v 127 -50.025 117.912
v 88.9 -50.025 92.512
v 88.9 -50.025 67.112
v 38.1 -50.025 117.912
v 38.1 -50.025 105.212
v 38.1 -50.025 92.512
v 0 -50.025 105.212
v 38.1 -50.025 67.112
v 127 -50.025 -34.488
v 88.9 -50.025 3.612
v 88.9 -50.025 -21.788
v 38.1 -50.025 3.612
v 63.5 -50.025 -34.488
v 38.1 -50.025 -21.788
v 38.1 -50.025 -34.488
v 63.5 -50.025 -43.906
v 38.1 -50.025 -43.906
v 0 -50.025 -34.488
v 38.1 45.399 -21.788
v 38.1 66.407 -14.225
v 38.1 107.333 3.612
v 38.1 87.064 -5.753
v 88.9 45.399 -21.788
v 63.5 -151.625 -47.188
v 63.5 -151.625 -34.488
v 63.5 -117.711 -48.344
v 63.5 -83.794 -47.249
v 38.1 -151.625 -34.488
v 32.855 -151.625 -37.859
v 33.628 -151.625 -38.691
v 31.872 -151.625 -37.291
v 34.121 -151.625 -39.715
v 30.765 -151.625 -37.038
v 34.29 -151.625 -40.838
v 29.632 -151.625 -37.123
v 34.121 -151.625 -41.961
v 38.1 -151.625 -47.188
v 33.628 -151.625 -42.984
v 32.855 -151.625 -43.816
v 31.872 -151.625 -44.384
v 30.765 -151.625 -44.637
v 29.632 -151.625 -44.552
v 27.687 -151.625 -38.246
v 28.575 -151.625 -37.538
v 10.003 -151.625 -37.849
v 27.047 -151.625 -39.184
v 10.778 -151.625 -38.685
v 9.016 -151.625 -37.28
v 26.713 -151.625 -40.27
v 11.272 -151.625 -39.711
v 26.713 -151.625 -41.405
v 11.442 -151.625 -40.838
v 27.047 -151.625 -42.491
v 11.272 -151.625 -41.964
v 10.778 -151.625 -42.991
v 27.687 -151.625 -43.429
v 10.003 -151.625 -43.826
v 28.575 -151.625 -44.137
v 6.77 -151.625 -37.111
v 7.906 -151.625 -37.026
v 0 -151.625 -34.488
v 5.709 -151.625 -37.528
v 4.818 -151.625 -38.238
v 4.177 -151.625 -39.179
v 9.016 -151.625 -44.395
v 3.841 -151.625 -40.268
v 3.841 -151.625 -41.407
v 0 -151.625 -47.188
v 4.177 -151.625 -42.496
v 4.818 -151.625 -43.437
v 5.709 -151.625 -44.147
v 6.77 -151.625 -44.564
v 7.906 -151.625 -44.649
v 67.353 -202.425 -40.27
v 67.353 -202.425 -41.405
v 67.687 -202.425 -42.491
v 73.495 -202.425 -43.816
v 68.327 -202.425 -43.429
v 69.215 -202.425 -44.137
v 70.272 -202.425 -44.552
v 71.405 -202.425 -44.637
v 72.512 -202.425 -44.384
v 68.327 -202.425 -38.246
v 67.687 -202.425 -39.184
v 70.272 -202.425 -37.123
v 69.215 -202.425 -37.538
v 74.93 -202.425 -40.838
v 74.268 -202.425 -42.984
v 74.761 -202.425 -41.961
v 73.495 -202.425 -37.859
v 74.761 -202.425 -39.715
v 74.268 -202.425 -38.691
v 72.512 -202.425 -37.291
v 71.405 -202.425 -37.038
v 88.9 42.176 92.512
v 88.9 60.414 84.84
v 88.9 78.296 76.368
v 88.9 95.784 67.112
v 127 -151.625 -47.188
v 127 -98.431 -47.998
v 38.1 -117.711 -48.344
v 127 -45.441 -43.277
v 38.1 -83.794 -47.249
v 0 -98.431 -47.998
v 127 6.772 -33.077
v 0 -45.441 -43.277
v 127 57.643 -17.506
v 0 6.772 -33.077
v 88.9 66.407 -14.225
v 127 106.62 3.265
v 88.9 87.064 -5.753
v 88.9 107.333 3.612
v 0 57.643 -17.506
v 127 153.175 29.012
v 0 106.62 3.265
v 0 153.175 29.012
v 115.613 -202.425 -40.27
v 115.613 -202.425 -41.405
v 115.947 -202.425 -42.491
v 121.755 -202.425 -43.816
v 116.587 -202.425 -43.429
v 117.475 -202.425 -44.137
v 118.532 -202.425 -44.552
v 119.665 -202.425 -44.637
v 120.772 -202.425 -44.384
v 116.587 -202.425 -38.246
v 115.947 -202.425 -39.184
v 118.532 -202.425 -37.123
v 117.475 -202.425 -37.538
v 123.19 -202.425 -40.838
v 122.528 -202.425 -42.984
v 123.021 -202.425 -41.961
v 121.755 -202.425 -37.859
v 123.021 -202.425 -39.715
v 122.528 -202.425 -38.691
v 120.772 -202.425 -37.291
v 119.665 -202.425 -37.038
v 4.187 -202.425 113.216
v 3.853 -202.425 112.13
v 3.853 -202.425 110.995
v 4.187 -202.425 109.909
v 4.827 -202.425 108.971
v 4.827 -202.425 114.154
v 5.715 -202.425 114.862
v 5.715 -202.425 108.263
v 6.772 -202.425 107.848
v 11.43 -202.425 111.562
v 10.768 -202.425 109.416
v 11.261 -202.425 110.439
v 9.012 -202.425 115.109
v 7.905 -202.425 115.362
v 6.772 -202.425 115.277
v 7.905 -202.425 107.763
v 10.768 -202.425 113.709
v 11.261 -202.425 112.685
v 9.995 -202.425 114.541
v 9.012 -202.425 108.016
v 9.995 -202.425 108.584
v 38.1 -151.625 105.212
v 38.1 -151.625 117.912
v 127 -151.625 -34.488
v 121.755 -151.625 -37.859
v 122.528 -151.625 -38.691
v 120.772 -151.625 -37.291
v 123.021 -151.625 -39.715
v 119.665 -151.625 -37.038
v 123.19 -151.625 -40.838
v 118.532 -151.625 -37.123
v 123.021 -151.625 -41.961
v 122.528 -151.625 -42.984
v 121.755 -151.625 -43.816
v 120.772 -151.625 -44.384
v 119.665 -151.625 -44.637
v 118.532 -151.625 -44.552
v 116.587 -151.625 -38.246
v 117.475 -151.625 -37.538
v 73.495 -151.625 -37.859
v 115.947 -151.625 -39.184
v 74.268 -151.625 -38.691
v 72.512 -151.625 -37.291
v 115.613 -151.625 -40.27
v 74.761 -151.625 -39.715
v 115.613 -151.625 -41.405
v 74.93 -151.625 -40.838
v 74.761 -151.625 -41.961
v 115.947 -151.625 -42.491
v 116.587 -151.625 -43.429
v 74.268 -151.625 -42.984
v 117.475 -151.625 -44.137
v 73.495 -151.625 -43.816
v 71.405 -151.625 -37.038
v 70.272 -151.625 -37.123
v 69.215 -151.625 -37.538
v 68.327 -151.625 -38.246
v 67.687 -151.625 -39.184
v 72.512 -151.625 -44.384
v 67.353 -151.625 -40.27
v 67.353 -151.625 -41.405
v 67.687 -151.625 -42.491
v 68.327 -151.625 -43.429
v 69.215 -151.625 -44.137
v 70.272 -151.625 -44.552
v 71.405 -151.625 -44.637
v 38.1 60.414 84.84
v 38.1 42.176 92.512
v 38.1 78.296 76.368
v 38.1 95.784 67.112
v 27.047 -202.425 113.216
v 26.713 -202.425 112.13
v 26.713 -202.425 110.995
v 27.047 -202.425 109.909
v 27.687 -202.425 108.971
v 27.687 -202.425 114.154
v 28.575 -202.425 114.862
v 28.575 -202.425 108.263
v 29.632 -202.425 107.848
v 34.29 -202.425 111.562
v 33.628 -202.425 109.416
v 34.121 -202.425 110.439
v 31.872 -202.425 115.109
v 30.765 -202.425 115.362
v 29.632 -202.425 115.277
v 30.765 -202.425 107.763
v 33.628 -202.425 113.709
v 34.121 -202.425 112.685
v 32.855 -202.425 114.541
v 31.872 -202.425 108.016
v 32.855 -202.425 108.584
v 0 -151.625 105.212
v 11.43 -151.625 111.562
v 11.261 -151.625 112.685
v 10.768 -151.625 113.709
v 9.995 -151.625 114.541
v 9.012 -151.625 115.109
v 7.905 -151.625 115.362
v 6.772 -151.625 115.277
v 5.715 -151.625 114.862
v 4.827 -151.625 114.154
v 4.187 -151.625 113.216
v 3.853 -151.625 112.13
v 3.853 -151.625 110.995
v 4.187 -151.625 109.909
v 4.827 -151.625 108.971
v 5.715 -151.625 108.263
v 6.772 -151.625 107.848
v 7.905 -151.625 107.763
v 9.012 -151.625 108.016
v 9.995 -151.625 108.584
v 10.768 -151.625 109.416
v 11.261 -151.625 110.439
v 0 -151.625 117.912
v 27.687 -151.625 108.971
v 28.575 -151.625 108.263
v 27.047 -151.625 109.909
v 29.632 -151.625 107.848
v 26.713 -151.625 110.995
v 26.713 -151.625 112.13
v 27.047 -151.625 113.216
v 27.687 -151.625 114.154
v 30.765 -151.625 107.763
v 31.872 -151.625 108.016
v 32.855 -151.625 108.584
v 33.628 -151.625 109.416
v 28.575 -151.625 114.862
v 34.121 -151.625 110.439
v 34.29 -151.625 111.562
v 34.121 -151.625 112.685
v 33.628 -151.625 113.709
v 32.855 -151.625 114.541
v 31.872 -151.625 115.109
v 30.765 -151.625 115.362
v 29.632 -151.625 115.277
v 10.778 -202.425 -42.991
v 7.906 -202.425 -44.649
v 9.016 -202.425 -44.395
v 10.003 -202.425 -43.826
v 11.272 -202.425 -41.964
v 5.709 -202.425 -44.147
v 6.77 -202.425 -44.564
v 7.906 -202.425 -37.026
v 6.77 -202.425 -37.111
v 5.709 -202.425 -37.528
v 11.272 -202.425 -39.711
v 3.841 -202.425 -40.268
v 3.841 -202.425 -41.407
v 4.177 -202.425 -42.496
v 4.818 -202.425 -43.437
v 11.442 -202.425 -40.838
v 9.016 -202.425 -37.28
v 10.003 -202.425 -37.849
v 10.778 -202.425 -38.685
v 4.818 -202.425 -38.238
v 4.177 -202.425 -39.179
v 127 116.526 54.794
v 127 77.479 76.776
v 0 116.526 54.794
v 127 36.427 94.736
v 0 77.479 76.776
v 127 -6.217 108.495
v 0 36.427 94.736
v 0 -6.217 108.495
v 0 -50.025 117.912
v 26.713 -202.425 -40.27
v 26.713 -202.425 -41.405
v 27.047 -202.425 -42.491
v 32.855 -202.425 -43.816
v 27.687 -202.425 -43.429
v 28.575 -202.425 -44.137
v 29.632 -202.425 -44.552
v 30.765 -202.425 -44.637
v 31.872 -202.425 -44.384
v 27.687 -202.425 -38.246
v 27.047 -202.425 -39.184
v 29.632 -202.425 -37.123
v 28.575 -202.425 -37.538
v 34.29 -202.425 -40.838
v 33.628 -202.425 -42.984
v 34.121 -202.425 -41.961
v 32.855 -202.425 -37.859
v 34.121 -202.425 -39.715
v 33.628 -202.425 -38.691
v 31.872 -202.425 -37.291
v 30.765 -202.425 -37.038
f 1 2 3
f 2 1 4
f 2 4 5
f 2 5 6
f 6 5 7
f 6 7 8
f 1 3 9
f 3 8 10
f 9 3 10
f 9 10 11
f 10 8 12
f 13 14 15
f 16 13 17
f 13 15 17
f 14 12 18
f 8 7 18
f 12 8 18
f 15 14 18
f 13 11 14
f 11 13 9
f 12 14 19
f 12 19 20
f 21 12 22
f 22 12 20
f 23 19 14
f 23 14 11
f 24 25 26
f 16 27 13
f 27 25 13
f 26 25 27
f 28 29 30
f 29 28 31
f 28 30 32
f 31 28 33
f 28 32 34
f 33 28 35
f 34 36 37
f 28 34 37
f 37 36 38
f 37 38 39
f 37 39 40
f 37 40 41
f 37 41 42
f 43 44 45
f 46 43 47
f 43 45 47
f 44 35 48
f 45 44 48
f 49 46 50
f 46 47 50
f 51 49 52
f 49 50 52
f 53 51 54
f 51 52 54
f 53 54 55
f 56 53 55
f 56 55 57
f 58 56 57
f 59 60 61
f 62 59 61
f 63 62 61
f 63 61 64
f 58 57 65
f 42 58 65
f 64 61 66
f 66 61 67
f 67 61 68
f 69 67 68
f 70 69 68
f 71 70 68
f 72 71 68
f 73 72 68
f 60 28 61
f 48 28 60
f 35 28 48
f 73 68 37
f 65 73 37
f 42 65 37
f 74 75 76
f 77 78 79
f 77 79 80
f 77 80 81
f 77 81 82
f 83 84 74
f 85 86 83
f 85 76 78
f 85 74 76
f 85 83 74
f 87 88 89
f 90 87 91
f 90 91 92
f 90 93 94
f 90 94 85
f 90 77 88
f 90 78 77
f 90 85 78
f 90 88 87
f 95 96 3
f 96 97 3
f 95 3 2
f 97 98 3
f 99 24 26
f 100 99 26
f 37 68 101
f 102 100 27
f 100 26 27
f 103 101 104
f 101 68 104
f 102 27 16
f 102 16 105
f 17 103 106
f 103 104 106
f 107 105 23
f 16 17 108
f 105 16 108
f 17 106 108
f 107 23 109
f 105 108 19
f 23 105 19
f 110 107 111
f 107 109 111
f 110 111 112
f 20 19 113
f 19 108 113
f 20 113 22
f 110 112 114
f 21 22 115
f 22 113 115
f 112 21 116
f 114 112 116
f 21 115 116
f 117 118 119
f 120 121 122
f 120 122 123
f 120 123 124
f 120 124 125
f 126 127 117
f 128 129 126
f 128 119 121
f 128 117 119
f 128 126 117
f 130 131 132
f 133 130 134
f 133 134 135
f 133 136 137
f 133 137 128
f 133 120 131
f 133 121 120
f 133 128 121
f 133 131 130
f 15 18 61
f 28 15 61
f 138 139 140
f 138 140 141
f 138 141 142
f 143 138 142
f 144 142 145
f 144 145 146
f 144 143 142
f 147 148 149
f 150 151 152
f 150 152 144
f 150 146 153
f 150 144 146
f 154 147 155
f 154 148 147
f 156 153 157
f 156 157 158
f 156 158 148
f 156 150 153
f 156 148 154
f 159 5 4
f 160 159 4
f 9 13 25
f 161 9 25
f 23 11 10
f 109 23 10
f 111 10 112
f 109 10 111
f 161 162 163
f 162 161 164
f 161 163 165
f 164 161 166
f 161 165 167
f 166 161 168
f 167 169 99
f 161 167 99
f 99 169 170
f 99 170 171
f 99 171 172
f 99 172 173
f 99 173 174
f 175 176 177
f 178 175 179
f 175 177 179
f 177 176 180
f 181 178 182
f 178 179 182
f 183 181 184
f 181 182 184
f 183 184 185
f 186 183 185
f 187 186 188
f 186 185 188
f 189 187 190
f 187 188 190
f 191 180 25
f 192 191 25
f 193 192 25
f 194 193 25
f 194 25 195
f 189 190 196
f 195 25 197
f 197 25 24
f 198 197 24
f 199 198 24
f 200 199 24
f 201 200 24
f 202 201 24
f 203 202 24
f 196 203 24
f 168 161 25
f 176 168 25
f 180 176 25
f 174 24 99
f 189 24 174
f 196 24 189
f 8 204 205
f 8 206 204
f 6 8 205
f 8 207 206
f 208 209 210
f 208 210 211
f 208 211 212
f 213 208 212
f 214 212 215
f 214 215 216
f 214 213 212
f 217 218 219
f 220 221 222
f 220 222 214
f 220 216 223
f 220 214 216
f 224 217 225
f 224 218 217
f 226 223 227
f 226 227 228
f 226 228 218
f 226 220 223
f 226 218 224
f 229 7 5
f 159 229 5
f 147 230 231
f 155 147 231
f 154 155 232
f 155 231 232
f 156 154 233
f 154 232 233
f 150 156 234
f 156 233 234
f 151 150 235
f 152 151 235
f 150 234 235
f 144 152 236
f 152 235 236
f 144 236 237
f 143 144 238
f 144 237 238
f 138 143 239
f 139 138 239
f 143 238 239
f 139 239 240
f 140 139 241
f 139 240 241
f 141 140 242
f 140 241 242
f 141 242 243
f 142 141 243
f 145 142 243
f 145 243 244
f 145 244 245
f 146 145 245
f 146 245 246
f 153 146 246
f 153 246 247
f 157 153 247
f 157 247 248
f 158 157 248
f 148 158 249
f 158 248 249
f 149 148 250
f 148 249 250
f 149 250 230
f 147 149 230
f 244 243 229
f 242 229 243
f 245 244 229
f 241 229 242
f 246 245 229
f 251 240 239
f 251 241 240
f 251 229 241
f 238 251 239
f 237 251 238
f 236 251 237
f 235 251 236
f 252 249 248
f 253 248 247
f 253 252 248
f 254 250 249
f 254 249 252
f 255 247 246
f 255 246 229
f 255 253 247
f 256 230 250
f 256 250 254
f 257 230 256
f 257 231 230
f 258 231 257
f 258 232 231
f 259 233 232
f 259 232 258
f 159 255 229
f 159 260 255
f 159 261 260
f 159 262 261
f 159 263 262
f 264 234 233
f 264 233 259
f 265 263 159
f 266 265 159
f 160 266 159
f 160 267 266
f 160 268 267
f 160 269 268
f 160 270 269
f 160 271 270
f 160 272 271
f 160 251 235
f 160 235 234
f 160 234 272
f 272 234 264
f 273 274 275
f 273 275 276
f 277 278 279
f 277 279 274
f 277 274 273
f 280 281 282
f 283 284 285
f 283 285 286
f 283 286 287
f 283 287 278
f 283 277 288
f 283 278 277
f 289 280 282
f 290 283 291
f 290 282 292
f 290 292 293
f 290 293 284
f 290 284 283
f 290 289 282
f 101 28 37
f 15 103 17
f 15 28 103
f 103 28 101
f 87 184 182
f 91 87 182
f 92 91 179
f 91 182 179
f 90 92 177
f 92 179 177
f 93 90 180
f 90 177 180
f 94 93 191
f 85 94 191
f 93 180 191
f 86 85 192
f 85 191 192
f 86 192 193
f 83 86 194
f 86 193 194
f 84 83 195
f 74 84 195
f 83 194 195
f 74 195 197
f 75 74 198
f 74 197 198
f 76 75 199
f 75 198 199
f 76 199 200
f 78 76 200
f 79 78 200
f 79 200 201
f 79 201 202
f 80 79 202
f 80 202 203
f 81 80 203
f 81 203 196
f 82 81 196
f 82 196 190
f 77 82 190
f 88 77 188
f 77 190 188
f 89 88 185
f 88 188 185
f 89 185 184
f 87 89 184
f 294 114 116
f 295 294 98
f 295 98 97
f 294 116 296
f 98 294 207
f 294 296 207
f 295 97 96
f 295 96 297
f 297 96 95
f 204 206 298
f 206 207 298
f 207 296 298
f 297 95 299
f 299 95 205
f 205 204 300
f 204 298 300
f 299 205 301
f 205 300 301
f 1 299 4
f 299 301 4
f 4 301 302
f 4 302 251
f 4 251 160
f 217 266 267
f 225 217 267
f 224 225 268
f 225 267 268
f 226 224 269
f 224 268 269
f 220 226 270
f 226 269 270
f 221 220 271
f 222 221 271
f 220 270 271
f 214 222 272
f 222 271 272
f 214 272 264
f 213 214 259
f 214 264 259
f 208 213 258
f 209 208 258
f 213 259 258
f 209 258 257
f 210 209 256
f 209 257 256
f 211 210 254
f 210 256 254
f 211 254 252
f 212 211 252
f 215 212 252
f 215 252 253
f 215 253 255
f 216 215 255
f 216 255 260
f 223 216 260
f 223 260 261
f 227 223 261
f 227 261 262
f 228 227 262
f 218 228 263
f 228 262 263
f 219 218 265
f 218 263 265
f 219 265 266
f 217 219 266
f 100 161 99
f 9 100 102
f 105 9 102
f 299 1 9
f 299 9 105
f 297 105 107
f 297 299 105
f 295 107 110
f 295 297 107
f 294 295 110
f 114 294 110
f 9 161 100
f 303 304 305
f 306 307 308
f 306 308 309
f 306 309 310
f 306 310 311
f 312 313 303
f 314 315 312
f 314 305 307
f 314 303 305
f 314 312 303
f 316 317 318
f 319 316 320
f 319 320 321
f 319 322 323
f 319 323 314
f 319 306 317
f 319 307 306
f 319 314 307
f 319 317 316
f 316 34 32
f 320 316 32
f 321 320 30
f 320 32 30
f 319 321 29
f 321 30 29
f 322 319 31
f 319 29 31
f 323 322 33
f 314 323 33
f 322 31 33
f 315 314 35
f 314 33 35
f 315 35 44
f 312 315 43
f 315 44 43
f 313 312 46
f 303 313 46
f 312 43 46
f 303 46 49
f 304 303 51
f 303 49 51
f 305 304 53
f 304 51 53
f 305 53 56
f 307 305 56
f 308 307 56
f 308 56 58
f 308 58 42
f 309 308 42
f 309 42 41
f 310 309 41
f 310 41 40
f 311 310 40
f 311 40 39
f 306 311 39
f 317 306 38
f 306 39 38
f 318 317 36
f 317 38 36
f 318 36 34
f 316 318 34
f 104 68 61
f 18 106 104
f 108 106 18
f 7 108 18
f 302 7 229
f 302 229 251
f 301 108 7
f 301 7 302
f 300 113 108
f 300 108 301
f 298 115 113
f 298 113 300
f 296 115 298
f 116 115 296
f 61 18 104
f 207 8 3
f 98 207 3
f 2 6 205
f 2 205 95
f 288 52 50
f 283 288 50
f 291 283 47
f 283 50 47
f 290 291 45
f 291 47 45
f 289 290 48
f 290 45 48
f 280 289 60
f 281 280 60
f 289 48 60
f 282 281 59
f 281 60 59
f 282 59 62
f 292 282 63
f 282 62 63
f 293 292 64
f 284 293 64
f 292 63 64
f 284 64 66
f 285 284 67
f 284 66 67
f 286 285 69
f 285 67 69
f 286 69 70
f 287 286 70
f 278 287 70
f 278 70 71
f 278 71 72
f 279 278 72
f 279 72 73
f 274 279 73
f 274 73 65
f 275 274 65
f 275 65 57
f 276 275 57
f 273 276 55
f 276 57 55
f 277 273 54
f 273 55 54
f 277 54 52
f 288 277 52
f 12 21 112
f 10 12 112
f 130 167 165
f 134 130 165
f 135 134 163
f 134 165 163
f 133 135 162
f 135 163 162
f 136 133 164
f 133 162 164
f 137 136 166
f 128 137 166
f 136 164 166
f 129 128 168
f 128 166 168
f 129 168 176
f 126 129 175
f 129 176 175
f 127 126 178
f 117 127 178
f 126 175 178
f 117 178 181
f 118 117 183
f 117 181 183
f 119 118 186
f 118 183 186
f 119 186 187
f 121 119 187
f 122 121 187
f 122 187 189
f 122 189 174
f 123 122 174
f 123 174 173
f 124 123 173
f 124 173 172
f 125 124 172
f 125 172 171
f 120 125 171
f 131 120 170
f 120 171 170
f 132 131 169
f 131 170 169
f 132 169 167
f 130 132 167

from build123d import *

# Parameters (mm, degrees)
F1_DEPTH  = 127
F2_W      = 25.4
F2_H      = 101.6
F3_DEPTH  = 25.4
F4_W      = 50.8
F4_H      = 25.4
F5_DEPTH  = 203.2
F6_R      = 3.81
F7_DEPTH  = 50.8
F8_R      = 3.821985
F8_R_2    = 3.81
F9_DEPTH  = 50.8
F10_W     = 38.1
F10_H     = 12.7
F11_DEPTH = 101.6
F12_R     = 3.81
F13_DEPTH = 50.8


with BuildPart() as f1:
    # F0 (on Right) → F1 (new body)
    with BuildSketch(Plane.YZ):
        with BuildLine():
            Line((-50.025108, 117.912475), (-50.025108, 29.012475))
            Line((-50.025108, 29.012475), (153.174892, 29.012475))
            ThreePointArc((153.174892, 29.012475), (57.178696, 86.271171), (-50.025108, 117.912475))
        make_face()
        with BuildLine():
            Line((153.174892, 29.012475), (-50.025108, 29.012475))
            Line((-50.025108, 29.012475), (-50.025108, -34.487525))
            Line((-50.025108, -34.487525), (-151.625108, -34.487525))
            Line((-151.625108, -34.487525), (-151.625108, -47.187525))
            ThreePointArc((-151.625108, -47.187525), (6.772136, -33.076502), (153.174892, 29.012475))
        make_face()
    extrude(amount=F1_DEPTH)

    # F2 (on face) → F3 (cut)
    with BuildSketch(Plane.XY.offset(-34.487525)):
        with Locations((50.8, -100.825108)):
            Rectangle(F2_W, F2_H)
    extrude(amount=-F3_DEPTH, mode=Mode.SUBTRACT)

    # F4 (on face) → F5 (cut)
    with BuildSketch(Plane.XZ.offset(50.025108)):
        with Locations((63.5, 79.812475)):
            Rectangle(F4_W, F4_H)
        with Locations((63.5, -9.087525)):
            Rectangle(F4_W, F4_H)
    extrude(amount=-F5_DEPTH, mode=Mode.SUBTRACT)

    # F6 (on face) → F7 (join)
    with BuildSketch(Plane.XZ.offset(151.625108)):
        with Locations((71.12, -40.837525)):
            Circle(F6_R)
        with Locations((119.38, -40.837525)):
            Circle(F6_R)
    extrude(amount=F7_DEPTH)

    # F8 (on face) → F9 (join)
    with BuildSketch(Plane.XZ.offset(151.625108)):
        with Locations((7.62, -40.837525)):
            Circle(F8_R)
        with Locations((30.48, -40.837525)):
            Circle(F8_R_2)
    extrude(amount=F9_DEPTH)

    # F10 (on face) → F11 (join)
    with BuildSketch(Plane.XZ.offset(50.025108)):
        with Locations((19.05, 111.562475)):
            Rectangle(F10_W, F10_H)
    extrude(amount=F11_DEPTH)

    # F12 (on face) → F13 (join)
    with BuildSketch(Plane.XZ.offset(151.625108)):
        with Locations((30.48, 111.562475)):
            Circle(F12_R)
        with Locations((7.62, 111.562475)):
            Circle(F12_R)
    extrude(amount=F13_DEPTH)


solid = f1.part
